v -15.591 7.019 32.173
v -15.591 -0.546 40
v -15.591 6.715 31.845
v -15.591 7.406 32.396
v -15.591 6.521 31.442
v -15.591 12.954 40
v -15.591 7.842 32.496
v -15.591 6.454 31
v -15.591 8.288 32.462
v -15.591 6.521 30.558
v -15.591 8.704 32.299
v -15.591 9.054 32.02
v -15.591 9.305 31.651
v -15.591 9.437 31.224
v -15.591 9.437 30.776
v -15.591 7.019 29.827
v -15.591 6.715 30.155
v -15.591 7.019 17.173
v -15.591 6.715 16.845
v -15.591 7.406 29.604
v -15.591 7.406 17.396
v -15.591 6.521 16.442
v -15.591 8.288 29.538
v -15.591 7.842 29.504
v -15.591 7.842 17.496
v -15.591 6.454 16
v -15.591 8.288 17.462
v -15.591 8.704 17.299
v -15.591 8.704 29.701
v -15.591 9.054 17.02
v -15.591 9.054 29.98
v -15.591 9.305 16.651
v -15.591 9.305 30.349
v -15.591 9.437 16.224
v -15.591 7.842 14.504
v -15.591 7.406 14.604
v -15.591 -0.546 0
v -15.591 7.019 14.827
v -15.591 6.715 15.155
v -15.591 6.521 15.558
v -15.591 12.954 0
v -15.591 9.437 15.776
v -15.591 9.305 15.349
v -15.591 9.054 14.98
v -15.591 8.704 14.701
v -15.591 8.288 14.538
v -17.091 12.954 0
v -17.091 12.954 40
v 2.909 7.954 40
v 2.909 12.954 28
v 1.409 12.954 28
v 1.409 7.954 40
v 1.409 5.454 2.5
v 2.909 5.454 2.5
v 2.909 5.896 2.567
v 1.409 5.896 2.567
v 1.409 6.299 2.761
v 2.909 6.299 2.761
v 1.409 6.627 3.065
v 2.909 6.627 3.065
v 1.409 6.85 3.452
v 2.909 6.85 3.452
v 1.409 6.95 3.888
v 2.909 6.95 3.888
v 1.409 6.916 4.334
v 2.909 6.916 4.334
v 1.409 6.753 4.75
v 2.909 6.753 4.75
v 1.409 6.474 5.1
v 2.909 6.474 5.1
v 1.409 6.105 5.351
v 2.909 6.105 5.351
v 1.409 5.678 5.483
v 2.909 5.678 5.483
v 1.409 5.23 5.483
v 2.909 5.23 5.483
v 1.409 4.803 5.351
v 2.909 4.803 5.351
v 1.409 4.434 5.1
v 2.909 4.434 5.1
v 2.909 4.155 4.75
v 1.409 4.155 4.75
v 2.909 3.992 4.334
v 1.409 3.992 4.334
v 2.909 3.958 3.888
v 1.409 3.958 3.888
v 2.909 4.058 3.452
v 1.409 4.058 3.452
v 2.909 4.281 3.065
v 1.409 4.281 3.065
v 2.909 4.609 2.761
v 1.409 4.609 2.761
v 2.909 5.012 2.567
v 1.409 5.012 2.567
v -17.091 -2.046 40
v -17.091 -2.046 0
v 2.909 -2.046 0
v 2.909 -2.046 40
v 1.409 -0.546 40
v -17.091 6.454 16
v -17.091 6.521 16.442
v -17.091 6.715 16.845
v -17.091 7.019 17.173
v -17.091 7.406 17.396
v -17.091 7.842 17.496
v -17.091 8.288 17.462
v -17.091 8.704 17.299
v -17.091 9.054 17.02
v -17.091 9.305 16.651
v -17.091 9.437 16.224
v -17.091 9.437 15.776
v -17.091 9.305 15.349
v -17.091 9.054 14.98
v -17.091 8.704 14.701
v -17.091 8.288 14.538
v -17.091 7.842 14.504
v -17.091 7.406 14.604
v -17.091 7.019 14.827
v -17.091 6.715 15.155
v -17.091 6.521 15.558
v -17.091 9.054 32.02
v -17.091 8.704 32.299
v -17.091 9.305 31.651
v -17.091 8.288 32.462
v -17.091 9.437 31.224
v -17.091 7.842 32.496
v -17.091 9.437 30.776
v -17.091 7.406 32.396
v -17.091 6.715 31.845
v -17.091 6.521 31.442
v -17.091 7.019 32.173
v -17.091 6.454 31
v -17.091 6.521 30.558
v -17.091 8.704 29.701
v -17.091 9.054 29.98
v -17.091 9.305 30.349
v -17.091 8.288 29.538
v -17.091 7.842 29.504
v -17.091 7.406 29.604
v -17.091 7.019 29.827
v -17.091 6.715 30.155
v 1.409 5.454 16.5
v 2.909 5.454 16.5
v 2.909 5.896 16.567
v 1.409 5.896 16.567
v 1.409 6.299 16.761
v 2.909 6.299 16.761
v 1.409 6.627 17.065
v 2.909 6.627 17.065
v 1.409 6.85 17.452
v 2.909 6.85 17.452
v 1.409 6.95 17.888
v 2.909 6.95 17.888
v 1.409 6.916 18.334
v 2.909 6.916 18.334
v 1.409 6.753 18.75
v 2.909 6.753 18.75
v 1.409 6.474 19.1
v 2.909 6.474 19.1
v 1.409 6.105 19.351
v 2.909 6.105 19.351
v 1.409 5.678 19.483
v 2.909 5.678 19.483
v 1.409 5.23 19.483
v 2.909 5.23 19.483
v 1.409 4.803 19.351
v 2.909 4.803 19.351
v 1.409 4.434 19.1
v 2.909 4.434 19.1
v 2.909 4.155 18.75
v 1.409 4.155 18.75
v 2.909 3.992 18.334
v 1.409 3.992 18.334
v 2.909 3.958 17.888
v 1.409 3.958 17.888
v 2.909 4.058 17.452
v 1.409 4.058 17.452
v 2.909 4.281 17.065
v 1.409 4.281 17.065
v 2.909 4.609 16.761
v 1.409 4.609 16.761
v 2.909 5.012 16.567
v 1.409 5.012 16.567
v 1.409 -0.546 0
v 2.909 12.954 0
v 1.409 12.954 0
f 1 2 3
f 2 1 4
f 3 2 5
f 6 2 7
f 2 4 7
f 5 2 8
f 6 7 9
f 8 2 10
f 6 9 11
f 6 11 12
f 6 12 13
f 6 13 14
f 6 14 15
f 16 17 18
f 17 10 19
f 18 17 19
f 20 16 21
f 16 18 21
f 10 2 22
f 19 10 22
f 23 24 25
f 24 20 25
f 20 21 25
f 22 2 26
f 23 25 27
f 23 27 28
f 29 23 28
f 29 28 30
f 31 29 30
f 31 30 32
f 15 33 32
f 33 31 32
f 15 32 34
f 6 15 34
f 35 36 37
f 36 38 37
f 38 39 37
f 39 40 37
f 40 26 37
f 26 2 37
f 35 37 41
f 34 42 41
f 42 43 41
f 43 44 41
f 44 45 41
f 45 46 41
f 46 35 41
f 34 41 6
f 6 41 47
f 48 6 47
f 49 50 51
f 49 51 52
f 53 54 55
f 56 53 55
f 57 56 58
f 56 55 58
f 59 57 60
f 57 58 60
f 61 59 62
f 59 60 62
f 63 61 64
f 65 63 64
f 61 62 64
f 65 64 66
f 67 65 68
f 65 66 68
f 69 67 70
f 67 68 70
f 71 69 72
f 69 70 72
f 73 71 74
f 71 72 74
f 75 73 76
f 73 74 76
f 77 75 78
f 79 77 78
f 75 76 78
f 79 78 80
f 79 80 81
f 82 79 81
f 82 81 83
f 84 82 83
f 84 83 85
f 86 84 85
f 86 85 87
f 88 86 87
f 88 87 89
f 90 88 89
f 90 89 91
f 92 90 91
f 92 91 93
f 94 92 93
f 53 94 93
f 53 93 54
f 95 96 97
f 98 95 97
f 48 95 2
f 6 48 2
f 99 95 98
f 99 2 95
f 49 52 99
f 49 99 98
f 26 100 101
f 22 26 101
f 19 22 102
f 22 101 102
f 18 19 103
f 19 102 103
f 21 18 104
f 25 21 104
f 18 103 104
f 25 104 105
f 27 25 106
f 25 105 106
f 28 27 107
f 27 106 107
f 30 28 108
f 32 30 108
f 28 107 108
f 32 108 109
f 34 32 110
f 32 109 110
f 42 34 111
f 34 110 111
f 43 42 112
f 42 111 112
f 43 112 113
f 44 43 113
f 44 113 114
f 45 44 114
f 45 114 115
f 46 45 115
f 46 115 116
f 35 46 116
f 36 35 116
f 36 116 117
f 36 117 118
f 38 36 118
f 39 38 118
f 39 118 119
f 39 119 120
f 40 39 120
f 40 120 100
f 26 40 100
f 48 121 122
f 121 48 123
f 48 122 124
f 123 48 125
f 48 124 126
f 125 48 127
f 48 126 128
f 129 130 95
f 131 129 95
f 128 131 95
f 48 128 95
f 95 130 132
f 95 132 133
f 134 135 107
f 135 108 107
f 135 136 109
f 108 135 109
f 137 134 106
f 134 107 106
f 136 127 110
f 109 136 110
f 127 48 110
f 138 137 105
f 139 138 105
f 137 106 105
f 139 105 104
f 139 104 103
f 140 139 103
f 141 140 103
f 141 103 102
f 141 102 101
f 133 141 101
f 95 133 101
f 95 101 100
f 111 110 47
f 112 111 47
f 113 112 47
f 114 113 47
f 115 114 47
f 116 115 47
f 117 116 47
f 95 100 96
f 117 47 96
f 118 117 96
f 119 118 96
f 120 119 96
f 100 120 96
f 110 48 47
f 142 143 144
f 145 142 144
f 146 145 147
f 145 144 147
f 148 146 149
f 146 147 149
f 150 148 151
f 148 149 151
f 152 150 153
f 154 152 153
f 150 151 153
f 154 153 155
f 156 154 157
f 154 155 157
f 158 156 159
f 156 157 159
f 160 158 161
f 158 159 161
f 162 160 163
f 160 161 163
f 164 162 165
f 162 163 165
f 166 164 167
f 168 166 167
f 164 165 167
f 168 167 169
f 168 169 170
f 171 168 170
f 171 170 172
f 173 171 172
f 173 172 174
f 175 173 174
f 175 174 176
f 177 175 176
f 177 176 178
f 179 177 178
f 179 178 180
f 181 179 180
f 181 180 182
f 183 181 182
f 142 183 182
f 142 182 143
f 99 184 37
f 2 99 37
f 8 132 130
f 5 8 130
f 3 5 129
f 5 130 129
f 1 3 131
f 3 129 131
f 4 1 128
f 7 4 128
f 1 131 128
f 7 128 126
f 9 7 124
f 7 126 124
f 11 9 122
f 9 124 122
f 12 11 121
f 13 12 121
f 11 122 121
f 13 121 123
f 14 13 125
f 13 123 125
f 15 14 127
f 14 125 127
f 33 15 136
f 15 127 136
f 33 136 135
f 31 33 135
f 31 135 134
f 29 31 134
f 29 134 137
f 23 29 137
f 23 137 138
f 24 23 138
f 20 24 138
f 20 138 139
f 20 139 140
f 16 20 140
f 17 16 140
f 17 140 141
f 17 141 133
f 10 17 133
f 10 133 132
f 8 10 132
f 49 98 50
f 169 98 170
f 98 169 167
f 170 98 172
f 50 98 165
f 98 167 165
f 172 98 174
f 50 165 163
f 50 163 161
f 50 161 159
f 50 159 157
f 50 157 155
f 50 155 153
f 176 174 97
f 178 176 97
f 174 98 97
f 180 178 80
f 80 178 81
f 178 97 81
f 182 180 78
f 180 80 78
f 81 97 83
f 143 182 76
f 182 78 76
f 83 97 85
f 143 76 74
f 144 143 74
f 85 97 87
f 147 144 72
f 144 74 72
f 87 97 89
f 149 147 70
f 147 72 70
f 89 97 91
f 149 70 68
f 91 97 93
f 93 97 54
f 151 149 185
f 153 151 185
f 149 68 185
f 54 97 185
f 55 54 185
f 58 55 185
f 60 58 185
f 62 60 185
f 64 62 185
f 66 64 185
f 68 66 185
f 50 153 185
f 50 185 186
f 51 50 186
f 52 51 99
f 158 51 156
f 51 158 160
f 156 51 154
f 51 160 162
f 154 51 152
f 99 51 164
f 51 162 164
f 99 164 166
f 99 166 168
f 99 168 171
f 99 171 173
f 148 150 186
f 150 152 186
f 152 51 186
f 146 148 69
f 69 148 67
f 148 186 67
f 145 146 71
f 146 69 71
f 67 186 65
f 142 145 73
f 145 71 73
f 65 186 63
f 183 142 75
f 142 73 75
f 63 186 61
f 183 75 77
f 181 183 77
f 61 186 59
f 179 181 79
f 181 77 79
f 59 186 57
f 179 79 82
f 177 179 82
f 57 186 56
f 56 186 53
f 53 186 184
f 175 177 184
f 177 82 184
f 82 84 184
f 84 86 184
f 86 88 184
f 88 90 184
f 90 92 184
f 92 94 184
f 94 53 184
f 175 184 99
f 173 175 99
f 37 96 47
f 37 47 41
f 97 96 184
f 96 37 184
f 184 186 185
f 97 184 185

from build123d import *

# Parameters (mm, degrees)
EXTRUSION1_DEPTH = 40
ESQUISSE2_R      = 1.5
EXTRUSION2_DEPTH = 10
ESQUISSE6_R      = 1.5
EXTRUSION6_DEPTH = 10


with BuildPart() as part:
    # Esquisse1 → Extrusion1 (new body)
    with BuildSketch(Plane.XY):
        Polygon((-17.090791643, 12.954), (-17.090791643, -2.046), (2.909208357, -2.046), (2.909208357, 12.954), (1.409208357, 12.954), (1.409208357, -0.546), (-15.590791643, -0.546), (-15.590791643, 12.954), align=None)
    extrude(amount=EXTRUSION1_DEPTH)

    # Esquisse2 → Extrusion2 (cut)
    with BuildSketch(Plane(origin=(2.909208357, 0, 0), x_dir=(0, 0, -1), z_dir=(1, 0, 0))):
        with Locations((-18, 5.454)):
            Circle(ESQUISSE2_R)
        with Locations((-4, 5.454)):
            Circle(ESQUISSE2_R)
        Polygon((-40, 12.954), (-28, 12.954), (-40, 7.954), align=None)
    extrude(amount=-EXTRUSION2_DEPTH, mode=Mode.SUBTRACT)

    # Esquisse6 → Extrusion6 (cut)
    with BuildSketch(Plane.ZY.offset(17.090791643)):
        with Locations(Location((31, 7.954, 0), (0, 0, 270))):
            Circle(ESQUISSE6_R)
        with Locations(Location((16, 7.954, 0), (0, 0, 270))):
            Circle(ESQUISSE6_R)
    extrude(amount=-EXTRUSION6_DEPTH, mode=Mode.SUBTRACT)


solid = part.part
